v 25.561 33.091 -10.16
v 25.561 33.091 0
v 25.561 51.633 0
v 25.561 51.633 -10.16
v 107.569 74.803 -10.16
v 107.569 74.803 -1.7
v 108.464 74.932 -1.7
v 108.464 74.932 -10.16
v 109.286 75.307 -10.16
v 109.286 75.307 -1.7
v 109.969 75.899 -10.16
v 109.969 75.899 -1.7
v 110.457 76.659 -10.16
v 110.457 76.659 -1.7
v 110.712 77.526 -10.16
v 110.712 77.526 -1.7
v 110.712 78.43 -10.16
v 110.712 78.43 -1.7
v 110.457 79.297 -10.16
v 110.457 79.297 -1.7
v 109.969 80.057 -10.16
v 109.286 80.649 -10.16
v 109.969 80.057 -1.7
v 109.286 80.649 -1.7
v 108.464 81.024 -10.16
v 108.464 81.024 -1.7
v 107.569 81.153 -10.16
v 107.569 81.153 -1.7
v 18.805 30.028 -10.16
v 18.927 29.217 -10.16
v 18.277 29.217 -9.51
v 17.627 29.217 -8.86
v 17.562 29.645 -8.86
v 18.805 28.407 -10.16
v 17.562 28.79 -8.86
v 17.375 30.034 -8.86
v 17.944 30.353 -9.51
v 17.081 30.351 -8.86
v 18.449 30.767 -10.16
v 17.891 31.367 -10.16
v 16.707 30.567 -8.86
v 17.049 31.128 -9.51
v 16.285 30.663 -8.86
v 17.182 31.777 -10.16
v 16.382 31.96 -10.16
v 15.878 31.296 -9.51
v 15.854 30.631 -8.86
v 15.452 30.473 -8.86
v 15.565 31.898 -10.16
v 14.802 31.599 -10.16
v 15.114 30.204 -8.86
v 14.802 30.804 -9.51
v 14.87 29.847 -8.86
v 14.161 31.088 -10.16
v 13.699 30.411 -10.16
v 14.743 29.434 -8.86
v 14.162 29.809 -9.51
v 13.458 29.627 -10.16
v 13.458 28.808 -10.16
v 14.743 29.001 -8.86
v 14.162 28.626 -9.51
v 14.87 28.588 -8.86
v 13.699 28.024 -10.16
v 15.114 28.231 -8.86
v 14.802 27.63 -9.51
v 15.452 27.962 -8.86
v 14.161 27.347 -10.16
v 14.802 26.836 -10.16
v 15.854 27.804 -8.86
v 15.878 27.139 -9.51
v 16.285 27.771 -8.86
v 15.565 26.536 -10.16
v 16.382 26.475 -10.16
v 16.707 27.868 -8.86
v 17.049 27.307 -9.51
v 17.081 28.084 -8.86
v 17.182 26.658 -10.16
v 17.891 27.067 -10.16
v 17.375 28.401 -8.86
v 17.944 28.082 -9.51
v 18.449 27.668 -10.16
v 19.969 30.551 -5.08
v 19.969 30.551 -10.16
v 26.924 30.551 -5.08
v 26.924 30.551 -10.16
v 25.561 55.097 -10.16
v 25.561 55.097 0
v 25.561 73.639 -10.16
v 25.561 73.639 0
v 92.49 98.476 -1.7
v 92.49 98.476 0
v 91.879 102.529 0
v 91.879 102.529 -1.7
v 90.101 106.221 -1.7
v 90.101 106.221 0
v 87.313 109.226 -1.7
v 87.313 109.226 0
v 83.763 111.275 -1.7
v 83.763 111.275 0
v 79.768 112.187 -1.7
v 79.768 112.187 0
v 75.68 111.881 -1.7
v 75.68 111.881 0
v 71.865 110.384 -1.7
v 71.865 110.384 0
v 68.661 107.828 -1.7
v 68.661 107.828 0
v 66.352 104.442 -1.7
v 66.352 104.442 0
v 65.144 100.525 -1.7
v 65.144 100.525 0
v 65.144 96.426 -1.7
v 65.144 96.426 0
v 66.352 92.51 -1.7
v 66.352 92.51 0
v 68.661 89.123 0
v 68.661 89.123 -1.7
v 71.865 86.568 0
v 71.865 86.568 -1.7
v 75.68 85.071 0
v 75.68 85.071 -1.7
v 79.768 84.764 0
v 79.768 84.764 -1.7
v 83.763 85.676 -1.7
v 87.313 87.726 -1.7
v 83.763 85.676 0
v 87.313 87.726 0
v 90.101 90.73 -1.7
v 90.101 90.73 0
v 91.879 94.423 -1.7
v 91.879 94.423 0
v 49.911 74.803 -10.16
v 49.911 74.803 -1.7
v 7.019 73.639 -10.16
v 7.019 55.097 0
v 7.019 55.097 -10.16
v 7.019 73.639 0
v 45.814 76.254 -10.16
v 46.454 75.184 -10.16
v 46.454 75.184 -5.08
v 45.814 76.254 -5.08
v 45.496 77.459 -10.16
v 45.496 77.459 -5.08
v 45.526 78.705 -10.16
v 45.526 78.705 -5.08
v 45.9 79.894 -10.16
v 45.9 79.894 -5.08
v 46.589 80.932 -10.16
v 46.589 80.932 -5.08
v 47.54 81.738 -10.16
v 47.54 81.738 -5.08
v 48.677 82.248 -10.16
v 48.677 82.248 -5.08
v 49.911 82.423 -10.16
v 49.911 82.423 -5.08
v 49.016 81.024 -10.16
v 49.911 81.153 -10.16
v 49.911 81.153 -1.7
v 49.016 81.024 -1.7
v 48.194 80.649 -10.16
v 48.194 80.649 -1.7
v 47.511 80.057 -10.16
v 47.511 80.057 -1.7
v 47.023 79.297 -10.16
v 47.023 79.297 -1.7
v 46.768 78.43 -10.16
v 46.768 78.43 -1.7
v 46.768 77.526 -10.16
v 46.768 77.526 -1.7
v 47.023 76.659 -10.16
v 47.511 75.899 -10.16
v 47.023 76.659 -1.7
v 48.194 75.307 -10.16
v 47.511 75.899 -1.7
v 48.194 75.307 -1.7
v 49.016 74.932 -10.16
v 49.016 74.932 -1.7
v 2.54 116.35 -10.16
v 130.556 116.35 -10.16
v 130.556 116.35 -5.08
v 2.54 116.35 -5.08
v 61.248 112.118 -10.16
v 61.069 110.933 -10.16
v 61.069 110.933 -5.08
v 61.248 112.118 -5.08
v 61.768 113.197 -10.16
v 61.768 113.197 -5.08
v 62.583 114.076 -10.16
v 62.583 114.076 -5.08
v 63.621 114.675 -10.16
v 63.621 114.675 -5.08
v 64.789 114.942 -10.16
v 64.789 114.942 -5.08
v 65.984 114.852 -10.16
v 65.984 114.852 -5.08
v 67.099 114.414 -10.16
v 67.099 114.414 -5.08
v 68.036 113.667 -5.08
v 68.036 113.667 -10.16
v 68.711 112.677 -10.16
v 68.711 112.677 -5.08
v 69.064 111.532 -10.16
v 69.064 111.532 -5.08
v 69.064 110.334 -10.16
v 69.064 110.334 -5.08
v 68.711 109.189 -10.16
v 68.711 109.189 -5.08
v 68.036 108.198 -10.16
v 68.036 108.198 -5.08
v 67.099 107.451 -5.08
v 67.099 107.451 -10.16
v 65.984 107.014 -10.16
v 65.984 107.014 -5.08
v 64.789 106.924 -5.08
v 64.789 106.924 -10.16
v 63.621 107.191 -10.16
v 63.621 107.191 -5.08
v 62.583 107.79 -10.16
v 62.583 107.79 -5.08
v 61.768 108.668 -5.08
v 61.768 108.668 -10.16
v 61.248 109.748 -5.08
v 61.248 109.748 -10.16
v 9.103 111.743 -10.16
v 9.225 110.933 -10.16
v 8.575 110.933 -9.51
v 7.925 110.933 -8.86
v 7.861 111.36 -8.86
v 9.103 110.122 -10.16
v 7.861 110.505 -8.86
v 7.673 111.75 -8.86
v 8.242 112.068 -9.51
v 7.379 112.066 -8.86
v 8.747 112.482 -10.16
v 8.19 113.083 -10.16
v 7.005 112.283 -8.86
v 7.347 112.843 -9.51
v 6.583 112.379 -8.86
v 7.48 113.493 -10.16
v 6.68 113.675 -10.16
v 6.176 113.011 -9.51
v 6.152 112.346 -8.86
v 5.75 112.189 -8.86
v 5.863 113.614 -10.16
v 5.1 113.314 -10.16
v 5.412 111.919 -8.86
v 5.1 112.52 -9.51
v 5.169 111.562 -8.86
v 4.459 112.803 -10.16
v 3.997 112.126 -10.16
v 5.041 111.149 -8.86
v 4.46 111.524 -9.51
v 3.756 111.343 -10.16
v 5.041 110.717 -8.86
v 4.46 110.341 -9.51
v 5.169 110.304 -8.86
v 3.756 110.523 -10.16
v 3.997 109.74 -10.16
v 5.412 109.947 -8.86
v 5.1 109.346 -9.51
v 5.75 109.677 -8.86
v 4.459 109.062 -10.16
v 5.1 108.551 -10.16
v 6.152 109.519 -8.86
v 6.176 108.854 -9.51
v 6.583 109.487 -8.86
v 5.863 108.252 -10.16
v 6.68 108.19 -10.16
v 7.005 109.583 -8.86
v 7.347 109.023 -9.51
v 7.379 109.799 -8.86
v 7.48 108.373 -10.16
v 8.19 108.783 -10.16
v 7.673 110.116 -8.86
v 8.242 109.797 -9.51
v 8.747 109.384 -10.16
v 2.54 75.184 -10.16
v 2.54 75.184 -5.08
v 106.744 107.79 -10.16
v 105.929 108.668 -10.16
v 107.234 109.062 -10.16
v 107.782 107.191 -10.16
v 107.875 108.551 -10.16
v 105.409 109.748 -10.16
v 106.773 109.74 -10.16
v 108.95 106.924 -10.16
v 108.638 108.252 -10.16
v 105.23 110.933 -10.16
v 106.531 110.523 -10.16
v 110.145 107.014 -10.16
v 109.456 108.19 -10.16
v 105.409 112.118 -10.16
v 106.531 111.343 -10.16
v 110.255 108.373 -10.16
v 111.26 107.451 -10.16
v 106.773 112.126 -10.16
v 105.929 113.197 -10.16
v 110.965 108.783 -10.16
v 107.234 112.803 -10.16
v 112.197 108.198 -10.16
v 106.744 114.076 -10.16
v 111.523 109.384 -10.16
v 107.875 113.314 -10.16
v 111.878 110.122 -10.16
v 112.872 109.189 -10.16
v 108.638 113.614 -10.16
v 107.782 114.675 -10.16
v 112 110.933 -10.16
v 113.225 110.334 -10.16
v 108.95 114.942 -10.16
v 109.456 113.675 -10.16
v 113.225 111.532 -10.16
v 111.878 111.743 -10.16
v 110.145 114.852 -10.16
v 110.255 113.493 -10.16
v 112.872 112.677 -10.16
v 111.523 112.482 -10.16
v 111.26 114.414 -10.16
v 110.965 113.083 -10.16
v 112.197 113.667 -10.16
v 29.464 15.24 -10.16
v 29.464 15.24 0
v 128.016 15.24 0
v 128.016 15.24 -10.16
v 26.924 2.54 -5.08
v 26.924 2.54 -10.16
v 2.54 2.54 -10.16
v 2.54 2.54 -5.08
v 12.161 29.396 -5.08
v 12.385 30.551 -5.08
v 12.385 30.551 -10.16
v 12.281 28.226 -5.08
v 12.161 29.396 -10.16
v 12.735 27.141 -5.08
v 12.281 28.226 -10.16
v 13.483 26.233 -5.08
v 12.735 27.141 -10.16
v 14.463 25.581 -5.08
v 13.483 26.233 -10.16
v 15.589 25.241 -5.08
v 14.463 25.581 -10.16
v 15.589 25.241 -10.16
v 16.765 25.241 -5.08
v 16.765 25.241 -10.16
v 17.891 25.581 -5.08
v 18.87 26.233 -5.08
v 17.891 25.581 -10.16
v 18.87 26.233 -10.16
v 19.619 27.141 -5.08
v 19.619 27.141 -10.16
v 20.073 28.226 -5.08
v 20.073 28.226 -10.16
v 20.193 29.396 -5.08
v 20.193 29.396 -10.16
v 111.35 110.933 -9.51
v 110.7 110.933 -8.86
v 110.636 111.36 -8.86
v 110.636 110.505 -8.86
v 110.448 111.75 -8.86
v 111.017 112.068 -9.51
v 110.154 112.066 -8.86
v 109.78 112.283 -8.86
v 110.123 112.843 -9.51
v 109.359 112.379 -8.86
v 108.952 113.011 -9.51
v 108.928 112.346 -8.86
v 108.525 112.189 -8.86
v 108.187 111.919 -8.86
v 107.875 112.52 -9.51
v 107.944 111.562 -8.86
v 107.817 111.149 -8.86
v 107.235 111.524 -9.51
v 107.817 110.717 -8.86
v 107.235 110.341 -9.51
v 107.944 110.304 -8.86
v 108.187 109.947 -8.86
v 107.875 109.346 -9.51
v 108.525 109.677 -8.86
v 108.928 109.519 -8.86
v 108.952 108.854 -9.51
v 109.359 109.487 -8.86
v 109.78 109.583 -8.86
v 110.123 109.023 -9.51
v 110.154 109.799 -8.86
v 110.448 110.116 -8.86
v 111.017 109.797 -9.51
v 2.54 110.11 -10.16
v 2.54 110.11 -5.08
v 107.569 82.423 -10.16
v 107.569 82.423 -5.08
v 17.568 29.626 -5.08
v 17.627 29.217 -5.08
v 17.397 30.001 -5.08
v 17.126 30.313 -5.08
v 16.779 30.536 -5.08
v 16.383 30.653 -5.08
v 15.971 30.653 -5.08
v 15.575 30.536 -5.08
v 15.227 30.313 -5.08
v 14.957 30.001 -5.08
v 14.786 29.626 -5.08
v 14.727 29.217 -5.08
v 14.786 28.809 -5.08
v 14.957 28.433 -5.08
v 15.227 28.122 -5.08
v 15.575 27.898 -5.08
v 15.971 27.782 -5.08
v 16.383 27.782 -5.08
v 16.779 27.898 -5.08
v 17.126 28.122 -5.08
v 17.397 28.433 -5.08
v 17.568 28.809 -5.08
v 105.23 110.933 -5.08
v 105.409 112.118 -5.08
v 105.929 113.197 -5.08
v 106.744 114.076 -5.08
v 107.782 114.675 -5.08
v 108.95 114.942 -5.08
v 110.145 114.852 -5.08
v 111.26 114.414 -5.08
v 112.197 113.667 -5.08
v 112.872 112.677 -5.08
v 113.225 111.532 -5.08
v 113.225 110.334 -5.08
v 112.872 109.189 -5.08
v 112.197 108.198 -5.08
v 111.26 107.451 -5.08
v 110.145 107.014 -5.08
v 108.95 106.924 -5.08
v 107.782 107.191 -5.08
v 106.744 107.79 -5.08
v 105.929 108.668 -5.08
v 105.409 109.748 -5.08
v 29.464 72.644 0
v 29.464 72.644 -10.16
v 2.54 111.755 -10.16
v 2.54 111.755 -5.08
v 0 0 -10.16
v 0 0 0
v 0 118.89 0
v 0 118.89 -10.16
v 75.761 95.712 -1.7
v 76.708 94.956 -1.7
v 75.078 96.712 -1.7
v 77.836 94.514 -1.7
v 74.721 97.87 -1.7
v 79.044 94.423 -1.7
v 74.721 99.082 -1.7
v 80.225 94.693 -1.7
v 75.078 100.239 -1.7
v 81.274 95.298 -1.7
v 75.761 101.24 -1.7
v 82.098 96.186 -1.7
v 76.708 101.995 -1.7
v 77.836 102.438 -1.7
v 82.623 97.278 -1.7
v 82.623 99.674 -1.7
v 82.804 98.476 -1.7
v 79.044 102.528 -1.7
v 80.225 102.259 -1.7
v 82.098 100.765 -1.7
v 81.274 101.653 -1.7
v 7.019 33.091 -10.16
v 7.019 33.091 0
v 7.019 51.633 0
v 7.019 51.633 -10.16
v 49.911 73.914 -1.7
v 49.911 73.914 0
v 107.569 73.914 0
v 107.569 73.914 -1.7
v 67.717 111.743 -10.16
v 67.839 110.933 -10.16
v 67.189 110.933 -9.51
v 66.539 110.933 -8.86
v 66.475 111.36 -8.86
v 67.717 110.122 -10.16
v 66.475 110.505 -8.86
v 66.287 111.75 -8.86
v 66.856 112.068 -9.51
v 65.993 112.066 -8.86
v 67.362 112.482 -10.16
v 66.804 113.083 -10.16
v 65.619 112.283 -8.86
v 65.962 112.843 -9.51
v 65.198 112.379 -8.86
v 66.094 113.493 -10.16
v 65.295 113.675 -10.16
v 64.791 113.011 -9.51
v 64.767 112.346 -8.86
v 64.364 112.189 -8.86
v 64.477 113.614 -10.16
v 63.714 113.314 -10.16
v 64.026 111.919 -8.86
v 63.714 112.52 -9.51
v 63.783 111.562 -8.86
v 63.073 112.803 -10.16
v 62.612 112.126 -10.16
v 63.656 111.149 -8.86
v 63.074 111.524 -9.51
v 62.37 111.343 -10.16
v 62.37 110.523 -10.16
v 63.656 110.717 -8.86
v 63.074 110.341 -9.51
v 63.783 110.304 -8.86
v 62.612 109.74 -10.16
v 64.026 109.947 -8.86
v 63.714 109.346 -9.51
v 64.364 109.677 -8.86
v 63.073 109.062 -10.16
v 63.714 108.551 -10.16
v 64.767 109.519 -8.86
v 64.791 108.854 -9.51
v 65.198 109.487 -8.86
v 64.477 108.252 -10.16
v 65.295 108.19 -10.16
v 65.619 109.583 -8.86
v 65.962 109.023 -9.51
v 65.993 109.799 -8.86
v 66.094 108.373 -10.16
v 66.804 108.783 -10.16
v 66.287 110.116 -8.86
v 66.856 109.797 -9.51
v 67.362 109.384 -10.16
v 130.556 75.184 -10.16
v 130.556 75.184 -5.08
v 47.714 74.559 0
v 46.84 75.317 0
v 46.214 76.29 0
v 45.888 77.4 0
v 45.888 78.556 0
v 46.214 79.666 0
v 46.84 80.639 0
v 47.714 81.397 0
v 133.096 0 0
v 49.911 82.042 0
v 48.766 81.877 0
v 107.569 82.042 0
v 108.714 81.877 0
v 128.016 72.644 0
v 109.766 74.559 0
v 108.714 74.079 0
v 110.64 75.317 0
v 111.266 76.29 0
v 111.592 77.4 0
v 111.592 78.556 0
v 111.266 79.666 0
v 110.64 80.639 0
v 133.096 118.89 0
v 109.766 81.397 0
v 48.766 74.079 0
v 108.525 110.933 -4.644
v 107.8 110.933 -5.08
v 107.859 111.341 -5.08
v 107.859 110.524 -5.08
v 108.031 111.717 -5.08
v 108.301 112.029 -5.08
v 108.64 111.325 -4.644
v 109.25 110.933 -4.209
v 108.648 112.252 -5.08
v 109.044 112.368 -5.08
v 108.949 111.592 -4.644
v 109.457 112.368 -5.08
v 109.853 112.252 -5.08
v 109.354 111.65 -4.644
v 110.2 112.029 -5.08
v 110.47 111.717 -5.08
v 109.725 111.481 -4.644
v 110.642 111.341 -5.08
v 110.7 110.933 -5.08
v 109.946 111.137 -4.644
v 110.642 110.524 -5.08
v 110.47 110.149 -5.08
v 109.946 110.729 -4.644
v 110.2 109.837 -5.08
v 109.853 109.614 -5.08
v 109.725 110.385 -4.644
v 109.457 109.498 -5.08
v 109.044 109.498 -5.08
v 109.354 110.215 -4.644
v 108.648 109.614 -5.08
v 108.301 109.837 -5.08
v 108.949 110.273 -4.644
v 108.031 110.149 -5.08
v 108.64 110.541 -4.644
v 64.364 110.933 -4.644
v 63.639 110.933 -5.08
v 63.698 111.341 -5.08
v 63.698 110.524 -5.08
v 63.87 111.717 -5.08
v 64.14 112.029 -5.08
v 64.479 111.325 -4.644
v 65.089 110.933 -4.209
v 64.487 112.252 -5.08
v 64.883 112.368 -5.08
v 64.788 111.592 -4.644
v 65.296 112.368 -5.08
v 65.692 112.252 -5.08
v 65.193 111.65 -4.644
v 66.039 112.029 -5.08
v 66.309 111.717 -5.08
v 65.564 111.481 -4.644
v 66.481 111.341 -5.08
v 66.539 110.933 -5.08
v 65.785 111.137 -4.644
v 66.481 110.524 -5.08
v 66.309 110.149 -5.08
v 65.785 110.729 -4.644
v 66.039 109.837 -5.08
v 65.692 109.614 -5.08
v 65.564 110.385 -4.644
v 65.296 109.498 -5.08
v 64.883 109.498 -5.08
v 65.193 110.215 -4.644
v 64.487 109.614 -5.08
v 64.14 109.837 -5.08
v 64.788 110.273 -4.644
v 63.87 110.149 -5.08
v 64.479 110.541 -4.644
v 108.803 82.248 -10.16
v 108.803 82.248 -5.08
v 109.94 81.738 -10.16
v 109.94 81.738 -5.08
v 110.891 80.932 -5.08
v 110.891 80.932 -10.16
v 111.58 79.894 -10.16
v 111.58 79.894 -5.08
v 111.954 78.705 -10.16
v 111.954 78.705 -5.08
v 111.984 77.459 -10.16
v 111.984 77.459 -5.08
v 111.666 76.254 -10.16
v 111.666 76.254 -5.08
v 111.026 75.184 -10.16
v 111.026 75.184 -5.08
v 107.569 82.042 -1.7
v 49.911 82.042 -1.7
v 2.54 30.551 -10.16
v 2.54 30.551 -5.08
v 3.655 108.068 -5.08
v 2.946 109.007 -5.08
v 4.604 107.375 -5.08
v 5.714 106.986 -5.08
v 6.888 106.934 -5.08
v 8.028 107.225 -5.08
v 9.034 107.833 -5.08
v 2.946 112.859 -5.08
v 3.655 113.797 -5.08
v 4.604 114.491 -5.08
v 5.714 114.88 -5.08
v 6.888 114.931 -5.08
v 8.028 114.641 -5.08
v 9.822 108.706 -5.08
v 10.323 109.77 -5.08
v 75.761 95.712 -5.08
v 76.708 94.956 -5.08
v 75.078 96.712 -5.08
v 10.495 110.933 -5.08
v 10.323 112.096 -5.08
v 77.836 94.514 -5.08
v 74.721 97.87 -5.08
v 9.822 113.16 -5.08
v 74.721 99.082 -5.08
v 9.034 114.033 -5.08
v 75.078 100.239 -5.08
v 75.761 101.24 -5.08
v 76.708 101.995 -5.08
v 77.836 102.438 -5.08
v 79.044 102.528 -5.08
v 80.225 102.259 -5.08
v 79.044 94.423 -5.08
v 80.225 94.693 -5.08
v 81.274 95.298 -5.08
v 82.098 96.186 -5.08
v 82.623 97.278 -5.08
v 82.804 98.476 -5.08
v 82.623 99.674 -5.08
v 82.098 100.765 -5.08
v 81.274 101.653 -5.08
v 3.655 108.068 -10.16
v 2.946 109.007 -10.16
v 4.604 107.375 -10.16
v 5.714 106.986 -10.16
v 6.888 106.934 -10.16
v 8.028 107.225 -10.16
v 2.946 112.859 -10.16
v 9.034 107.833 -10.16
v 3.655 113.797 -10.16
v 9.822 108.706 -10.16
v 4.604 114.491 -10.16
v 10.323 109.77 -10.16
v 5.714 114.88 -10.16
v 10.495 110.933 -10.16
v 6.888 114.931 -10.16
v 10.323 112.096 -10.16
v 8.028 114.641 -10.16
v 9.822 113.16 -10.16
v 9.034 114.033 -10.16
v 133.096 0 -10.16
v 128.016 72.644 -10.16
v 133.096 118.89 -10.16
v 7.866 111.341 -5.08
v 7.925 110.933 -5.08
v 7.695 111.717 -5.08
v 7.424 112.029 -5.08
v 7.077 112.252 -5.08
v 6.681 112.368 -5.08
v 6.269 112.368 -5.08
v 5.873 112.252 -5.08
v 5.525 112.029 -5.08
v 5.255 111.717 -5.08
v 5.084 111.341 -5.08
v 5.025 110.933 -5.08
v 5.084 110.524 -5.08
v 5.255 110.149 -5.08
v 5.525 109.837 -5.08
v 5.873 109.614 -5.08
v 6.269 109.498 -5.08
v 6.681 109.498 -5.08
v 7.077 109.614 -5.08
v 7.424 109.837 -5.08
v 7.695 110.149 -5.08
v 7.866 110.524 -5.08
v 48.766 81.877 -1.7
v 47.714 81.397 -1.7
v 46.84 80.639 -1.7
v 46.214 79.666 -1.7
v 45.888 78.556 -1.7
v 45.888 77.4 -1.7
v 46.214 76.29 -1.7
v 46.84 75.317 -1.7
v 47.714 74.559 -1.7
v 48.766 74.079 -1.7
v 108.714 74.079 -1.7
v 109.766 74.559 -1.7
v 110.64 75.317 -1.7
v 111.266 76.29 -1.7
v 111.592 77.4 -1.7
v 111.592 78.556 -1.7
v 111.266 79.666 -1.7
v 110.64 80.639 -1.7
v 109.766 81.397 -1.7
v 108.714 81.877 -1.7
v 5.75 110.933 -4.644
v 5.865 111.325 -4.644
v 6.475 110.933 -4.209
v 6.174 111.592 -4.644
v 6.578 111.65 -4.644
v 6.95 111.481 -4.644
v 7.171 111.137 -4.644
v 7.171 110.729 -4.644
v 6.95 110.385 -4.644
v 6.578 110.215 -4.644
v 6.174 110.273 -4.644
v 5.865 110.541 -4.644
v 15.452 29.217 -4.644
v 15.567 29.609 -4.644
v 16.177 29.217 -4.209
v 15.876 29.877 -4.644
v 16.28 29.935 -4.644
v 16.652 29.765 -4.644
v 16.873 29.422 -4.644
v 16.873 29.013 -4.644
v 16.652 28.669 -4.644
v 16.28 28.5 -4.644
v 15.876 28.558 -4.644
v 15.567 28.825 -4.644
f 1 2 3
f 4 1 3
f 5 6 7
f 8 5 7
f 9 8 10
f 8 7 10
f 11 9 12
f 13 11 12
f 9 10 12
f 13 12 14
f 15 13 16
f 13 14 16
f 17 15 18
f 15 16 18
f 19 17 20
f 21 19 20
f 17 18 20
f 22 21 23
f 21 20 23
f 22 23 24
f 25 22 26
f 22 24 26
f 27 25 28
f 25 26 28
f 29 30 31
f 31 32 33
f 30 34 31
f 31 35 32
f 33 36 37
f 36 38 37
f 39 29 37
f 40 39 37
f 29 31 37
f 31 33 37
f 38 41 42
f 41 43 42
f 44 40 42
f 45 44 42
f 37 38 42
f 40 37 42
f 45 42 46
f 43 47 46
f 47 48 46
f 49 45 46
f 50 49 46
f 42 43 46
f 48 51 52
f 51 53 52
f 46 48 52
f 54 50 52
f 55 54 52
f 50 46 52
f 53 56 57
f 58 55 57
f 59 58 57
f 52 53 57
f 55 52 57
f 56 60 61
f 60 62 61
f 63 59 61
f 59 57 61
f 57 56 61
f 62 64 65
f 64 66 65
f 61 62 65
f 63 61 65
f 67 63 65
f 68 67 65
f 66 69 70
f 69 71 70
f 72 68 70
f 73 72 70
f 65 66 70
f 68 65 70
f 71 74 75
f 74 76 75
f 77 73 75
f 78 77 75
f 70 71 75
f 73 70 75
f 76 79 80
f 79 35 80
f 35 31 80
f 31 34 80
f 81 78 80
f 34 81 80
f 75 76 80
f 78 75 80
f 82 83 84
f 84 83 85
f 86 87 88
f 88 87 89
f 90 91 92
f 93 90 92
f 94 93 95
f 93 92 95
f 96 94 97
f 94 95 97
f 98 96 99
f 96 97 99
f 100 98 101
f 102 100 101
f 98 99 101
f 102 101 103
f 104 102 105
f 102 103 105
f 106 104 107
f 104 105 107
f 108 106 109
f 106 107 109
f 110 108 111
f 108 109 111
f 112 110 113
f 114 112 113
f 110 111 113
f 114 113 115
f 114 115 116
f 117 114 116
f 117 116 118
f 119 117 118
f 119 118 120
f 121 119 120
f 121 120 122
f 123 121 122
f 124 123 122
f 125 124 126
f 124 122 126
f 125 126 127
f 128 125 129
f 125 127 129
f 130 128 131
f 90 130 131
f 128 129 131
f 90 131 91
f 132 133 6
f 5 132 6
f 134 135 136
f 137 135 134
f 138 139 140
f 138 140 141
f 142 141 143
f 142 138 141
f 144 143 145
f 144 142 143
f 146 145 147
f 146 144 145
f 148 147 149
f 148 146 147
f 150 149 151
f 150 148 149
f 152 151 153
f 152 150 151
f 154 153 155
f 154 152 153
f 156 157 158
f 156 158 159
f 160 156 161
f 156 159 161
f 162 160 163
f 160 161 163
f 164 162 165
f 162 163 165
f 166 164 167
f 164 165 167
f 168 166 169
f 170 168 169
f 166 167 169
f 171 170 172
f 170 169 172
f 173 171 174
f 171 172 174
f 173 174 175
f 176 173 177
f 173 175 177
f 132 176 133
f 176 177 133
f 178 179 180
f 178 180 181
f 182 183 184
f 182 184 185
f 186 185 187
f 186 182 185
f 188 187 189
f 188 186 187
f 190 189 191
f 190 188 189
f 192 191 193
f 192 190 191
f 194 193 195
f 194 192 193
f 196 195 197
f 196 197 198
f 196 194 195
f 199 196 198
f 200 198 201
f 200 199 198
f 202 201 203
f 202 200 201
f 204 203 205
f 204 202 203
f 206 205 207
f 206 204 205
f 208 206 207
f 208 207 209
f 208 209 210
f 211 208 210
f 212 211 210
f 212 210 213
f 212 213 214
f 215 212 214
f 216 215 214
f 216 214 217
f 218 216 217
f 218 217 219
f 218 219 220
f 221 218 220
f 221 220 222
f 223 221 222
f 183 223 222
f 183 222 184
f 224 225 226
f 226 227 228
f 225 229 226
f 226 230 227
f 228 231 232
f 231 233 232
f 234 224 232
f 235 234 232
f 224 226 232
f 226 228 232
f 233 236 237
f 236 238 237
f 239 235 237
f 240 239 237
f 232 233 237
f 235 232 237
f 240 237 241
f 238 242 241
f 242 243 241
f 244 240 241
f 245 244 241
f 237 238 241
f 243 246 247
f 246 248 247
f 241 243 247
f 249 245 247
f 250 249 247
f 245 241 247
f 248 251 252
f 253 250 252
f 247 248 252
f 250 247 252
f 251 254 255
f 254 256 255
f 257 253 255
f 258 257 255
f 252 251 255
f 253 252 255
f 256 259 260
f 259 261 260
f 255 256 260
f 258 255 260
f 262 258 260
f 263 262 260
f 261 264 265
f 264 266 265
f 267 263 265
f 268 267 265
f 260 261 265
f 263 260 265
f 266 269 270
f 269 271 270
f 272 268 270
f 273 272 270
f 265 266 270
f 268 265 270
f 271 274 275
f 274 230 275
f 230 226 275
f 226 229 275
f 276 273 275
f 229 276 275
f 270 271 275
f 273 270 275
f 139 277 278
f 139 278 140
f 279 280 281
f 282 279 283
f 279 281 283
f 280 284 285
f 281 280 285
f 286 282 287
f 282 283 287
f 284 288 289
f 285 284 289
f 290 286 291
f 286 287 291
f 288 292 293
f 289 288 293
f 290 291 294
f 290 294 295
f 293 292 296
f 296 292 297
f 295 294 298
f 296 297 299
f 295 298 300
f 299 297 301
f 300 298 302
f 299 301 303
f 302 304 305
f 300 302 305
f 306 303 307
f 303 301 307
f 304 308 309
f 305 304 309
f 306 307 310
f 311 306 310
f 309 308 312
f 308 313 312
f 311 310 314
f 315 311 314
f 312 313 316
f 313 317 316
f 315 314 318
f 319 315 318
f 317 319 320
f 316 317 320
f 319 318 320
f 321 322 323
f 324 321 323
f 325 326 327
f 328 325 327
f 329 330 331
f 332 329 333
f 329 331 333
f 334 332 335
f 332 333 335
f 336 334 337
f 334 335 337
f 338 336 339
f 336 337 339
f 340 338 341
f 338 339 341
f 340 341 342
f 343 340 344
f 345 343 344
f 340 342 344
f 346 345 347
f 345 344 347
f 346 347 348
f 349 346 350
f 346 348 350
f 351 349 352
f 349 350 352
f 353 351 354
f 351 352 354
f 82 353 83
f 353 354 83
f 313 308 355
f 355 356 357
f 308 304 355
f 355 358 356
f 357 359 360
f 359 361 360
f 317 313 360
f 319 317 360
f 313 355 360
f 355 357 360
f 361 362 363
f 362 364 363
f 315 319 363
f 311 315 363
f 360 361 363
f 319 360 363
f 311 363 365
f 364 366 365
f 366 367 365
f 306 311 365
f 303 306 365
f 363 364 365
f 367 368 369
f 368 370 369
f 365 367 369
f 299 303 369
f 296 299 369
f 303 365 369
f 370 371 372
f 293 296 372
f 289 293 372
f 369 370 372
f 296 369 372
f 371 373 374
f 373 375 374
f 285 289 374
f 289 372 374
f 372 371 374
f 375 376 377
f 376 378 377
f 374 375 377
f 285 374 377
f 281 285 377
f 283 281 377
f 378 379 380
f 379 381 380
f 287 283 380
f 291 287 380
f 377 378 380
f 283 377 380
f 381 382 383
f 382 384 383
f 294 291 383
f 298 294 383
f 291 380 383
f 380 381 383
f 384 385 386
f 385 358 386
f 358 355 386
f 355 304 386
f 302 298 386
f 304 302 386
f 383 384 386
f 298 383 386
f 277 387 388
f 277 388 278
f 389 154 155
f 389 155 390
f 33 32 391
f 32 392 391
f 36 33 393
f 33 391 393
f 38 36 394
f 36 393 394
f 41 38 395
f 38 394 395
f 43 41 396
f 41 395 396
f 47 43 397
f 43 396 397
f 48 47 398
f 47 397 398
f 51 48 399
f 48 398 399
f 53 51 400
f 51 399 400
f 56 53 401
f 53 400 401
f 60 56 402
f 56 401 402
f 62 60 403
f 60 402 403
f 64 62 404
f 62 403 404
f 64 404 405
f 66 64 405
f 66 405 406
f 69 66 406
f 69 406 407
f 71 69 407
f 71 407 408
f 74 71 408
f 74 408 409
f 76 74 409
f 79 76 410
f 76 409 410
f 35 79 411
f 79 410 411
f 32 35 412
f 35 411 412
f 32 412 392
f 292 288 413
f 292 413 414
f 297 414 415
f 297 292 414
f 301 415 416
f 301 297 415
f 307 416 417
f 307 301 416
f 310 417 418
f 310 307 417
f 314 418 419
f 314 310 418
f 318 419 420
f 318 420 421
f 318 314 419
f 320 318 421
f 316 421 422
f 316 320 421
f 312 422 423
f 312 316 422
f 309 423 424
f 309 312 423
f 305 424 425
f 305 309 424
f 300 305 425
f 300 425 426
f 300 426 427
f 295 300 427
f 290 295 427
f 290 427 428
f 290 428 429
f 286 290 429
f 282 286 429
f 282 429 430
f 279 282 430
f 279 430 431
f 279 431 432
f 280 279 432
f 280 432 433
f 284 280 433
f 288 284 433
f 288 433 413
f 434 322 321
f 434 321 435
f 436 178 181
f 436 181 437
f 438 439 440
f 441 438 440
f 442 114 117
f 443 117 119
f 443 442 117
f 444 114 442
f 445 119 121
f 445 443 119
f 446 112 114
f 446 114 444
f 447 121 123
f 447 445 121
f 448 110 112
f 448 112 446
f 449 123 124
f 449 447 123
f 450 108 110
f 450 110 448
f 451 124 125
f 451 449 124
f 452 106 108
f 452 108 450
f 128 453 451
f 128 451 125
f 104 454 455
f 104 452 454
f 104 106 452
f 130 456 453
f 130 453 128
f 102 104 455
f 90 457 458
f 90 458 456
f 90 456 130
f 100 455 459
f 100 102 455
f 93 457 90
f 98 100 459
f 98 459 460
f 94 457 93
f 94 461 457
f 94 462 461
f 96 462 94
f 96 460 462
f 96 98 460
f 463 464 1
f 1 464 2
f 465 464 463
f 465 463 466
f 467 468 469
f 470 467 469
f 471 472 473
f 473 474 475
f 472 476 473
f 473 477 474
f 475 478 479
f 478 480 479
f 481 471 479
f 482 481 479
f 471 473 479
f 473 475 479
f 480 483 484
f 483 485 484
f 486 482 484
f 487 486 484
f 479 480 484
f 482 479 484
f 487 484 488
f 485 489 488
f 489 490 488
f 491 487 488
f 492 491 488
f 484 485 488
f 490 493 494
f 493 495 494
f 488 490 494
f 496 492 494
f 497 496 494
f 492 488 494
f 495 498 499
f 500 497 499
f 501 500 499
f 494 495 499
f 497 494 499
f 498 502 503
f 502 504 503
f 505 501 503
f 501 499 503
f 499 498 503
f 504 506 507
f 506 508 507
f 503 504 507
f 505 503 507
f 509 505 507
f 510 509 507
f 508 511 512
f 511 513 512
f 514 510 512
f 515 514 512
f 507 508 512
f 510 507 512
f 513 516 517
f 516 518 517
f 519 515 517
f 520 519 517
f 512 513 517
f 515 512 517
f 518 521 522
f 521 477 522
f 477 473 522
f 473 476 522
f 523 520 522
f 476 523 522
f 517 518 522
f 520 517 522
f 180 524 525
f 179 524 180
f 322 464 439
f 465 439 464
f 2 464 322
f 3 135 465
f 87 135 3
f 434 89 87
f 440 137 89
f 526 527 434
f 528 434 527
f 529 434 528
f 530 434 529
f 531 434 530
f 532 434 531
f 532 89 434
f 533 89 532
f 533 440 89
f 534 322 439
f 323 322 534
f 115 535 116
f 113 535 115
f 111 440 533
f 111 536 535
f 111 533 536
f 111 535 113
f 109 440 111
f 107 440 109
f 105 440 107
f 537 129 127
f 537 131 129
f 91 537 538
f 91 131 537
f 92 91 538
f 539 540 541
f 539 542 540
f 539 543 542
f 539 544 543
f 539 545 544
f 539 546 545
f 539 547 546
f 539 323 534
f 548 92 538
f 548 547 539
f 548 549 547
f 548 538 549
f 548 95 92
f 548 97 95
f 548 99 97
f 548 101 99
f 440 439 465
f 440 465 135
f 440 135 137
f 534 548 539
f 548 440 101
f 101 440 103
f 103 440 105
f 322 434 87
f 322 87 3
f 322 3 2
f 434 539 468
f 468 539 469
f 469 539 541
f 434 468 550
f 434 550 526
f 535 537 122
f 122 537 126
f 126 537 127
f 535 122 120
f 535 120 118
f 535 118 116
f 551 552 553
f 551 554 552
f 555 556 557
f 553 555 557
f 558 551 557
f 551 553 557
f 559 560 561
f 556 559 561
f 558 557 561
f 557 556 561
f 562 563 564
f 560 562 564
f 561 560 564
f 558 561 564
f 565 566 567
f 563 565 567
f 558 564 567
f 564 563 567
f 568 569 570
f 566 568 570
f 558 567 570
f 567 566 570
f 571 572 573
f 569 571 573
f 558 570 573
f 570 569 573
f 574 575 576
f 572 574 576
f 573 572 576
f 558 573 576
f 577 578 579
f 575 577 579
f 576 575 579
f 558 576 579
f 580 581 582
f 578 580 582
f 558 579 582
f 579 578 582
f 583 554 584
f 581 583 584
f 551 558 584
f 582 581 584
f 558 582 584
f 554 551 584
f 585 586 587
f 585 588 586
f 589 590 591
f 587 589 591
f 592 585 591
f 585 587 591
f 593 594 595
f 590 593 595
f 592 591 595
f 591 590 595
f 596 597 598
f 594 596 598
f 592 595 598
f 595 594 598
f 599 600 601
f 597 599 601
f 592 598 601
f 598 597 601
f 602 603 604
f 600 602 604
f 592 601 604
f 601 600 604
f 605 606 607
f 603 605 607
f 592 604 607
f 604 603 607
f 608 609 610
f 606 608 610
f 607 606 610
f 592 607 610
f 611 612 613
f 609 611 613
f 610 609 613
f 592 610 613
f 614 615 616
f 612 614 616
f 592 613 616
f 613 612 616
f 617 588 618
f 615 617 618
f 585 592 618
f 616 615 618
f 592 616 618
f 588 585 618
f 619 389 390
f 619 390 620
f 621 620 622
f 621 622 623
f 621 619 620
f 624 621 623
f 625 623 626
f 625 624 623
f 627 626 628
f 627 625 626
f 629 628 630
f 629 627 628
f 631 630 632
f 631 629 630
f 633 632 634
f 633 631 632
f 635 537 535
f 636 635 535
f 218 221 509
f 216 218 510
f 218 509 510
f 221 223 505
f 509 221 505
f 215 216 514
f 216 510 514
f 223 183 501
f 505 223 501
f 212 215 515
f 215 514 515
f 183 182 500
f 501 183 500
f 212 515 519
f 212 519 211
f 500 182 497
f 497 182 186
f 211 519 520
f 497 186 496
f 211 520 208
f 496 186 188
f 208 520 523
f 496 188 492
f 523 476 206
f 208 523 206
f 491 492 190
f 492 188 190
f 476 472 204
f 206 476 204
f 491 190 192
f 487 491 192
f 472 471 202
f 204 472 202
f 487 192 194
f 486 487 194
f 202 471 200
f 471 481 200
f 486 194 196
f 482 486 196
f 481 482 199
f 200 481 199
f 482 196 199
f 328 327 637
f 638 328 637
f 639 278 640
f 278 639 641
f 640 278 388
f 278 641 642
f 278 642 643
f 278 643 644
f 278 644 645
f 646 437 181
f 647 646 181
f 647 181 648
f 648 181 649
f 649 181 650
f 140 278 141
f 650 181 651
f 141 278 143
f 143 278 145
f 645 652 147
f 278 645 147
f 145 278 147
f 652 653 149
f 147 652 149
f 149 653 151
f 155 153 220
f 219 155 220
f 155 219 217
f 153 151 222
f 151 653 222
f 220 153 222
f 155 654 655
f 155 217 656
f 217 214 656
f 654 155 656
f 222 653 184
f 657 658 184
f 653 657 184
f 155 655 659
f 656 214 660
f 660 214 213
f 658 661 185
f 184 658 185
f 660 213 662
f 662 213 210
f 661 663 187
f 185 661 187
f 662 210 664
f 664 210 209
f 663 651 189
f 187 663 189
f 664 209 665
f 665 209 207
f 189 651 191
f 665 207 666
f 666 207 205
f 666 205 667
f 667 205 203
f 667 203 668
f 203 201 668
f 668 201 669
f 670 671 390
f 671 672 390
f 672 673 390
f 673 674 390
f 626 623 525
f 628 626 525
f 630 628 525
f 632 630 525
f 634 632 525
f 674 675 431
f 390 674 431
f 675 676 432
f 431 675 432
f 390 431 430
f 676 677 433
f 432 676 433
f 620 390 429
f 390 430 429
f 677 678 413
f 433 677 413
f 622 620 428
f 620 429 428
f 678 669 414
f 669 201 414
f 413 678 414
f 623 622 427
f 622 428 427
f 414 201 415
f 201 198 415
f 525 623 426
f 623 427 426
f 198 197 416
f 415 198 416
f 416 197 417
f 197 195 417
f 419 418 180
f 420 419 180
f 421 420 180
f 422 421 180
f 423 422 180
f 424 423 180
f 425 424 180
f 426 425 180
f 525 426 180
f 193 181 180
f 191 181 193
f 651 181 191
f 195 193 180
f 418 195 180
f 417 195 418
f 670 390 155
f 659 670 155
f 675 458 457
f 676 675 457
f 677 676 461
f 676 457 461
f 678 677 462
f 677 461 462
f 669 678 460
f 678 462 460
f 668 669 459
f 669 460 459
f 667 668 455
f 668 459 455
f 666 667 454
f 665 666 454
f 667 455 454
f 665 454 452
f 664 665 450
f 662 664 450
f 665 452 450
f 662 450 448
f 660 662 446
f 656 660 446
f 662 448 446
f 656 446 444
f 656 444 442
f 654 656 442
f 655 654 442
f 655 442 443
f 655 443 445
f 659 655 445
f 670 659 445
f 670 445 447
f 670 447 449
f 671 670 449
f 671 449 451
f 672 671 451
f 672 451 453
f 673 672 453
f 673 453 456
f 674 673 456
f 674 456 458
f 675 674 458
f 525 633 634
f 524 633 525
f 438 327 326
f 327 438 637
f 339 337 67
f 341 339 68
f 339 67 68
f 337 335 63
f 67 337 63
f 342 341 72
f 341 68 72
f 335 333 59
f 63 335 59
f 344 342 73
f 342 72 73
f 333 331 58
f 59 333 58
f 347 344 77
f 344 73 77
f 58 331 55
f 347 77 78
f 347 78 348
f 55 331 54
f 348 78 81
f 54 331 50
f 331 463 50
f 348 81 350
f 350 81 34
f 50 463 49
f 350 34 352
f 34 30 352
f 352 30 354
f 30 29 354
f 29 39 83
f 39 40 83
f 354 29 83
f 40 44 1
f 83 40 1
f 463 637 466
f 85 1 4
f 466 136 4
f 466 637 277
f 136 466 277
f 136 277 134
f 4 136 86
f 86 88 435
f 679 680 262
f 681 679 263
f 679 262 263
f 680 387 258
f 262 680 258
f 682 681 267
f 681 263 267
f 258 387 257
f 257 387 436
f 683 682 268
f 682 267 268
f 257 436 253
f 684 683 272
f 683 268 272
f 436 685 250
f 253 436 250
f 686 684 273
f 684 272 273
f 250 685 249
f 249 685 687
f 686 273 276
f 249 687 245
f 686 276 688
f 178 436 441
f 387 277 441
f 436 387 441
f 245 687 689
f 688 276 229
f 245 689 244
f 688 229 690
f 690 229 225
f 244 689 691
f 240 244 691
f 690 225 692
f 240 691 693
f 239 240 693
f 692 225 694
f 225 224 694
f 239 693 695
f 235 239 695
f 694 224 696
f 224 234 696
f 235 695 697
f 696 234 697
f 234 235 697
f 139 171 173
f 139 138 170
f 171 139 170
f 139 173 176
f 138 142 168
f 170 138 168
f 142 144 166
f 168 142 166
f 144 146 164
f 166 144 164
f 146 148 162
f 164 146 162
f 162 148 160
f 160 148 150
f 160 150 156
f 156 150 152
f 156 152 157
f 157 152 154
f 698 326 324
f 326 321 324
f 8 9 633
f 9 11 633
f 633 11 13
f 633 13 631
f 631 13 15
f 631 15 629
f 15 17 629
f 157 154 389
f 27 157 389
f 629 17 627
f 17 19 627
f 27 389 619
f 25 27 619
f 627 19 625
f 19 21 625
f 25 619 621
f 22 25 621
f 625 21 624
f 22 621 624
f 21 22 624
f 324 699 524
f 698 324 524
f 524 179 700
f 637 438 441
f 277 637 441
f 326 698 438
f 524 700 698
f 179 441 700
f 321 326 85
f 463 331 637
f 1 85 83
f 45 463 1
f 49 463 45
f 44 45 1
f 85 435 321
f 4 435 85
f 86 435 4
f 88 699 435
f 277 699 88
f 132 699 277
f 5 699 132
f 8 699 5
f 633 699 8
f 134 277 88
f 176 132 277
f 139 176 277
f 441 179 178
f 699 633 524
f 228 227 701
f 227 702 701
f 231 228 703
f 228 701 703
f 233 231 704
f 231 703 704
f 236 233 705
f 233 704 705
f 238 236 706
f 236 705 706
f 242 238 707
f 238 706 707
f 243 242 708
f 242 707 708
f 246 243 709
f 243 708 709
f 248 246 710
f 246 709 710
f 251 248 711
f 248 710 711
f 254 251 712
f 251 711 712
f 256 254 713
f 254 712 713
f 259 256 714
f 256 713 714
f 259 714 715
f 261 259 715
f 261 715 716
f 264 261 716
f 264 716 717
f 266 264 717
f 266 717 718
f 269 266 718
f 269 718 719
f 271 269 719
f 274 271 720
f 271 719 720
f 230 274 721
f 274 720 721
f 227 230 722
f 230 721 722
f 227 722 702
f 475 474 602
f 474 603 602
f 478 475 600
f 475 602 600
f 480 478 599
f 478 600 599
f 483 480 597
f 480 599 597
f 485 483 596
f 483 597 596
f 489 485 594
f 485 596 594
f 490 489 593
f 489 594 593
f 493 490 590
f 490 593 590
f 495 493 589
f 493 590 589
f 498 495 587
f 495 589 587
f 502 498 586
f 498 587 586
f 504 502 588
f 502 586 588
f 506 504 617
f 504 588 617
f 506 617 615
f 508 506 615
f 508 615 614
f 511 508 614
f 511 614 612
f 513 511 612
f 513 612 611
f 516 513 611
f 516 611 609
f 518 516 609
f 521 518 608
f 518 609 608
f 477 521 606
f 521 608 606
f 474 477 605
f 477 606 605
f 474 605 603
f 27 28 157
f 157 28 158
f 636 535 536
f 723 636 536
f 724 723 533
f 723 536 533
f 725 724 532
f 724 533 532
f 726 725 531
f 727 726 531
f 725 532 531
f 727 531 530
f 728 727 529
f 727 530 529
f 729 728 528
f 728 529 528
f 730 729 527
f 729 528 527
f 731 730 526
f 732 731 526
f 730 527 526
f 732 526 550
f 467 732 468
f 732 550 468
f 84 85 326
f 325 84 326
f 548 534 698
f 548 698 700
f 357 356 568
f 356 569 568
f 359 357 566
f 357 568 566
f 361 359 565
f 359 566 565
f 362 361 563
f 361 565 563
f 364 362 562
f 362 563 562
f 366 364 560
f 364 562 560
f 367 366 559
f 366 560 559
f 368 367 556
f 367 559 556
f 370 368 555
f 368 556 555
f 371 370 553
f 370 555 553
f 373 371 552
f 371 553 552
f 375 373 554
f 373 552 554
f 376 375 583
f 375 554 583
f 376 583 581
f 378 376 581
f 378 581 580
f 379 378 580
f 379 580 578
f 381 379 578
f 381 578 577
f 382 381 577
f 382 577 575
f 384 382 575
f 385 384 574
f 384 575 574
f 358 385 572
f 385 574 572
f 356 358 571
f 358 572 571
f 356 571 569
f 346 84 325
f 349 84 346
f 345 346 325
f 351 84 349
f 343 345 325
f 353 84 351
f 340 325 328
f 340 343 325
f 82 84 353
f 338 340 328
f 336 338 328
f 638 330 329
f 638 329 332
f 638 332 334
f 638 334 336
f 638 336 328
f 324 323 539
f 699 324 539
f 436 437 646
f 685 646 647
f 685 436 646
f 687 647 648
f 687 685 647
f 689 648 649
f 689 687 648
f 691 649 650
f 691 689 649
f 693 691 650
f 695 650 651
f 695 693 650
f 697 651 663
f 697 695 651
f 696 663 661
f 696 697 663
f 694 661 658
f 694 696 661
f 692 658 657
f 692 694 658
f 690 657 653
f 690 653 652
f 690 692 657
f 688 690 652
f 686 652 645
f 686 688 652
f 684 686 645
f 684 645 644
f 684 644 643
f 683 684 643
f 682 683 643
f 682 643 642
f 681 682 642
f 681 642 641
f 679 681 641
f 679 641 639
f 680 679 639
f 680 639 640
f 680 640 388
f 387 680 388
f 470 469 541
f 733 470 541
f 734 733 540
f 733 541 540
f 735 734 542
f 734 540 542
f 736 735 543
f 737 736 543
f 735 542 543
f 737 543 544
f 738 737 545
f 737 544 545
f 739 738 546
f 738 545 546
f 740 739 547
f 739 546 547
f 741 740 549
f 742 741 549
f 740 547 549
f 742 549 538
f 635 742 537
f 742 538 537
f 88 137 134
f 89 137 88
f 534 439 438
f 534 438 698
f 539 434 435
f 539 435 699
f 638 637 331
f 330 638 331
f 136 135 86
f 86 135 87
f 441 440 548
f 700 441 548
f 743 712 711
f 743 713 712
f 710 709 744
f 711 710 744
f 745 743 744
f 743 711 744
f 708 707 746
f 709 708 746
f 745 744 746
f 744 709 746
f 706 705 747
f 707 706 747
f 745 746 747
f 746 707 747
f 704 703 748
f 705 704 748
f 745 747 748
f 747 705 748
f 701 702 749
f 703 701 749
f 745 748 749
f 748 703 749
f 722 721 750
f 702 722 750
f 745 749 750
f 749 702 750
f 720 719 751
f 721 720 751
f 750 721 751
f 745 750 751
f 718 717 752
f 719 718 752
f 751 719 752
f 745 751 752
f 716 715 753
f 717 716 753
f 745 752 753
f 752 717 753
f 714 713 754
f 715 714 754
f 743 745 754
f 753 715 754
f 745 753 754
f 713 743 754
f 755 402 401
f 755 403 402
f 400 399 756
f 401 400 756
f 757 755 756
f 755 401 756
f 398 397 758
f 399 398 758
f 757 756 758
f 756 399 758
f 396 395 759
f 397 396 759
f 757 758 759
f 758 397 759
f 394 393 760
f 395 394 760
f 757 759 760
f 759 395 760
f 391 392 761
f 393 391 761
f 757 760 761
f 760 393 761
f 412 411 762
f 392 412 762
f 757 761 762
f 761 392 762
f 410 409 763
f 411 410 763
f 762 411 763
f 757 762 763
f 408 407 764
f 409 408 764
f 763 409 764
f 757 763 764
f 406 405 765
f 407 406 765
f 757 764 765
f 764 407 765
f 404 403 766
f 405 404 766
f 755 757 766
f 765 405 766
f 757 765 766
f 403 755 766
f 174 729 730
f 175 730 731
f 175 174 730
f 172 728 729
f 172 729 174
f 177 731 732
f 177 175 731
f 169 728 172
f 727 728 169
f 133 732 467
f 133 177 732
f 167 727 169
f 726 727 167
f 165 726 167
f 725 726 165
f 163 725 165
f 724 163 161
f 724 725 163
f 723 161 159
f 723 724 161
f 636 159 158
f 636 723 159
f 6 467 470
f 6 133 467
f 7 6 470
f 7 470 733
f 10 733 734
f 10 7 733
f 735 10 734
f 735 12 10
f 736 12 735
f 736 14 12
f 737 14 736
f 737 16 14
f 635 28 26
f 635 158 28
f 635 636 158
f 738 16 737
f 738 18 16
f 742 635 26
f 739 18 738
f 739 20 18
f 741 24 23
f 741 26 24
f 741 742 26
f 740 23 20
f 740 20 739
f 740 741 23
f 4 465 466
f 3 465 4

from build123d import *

# Parameters (mm, degrees)
SKETCH1_W                                         = 133.096
SKETCH1_H                                         = 118.890132416
BOSS_EXTRUDE1_DEPTH                               = 10.16
SKETCH1_11_W                                      = 98.552
SKETCH1_11_H                                      = 57.404
SKETCH1_11_W_2                                    = 18.542
SKETCH1_11_H_2                                    = 18.542
SKETCH1_11_R                                      = 4.064
CUT_EXTRUDE1_DEPTH                                = 179.752998302
SKETCH1_12_R                                      = 13.75
SKETCH1_12_R_2                                    = 4.064
CUT_EXTRUDE2_DEPTH                                = 1.7
CSK_FOR_M2_5_FLAT_HEAD_MACHINE_SCREW1_D           = 2.9
CSK_FOR_M2_5_FLAT_HEAD_MACHINE_SCREW1_DEPTH       = 5.08
CSK_FOR_M2_5_FLAT_HEAD_MACHINE_SCREW1_CSINK_D     = 5.5
CSK_FOR_M2_5_FLAT_HEAD_MACHINE_SCREW1_CSINK_ANGLE = 90
CSK_FOR_M2_5_FLAT_HEAD_MACHINE_SCREW1_TIP         = 0.871247898
SKETCH6_R                                         = 4.02
CUT_EXTRUDE3_DEPTH                                = 7.62


with BuildPart() as part:
    # Sketch1 → Boss-Extrude1 (new body)
    with BuildSketch(Plane.XY):
        with Locations((66.548, 59.445066208)):
            Rectangle(SKETCH1_W, SKETCH1_H)
    extrude(amount=-BOSS_EXTRUDE1_DEPTH)

    # Sketch1<11> → Cut-Extrude1 (cut, through all)
    with BuildSketch(Plane.XY):
        with Locations((78.74, 43.942)):
            Rectangle(SKETCH1_11_W, SKETCH1_11_H)
        with Locations((16.289896793, 42.362289183)):
            Rectangle(SKETCH1_11_W_2, SKETCH1_11_H_2)
        with Locations((16.289896793, 64.367970222)):
            Rectangle(SKETCH1_11_W_2, SKETCH1_11_H_2)
        with BuildLine():
            Line((107.569, 81.153), (49.911, 81.153))
            ThreePointArc((49.911, 81.153), (46.736, 77.978), (49.911, 74.803))
            Line((49.911, 74.803), (107.569, 74.803))
            ThreePointArc((107.569, 74.803), (110.744, 77.978), (107.569, 81.153))
        make_face()
        with Locations((78.74, 98.4758)):
            Circle(SKETCH1_11_R)
    extrude(amount=-CUT_EXTRUDE1_DEPTH, mode=Mode.SUBTRACT)

    # Sketch1<12> → Cut-Extrude2 (cut)
    # profile 1 of 2: a face of its own
    with BuildSketch(Plane.XY):
        with BuildLine():
            Line((107.569, 82.042), (49.911, 82.042))
            ThreePointArc((49.911, 82.042), (45.847, 77.978), (49.911, 73.914))
            Line((49.911, 73.914), (107.569, 73.914))
            ThreePointArc((107.569, 73.914), (111.633, 77.978), (107.569, 82.042))
        make_face()
        with BuildLine():
            ThreePointArc((49.911, 74.803), (46.736, 77.978), (49.911, 81.153))
            Line((49.911, 81.153), (107.569, 81.153))
            ThreePointArc((107.569, 81.153), (110.744, 77.978), (107.569, 74.803))
            Line((107.569, 74.803), (49.911, 74.803))
        make_face(mode=Mode.SUBTRACT)
    # profile 2 of 2: a face of its own
    with BuildSketch(Plane.XY):
        with Locations((78.74, 98.4758)):
            Circle(SKETCH1_12_R)
        with Locations((78.74, 98.4758)):
            Circle(SKETCH1_12_R_2, mode=Mode.SUBTRACT)
    extrude(amount=-CUT_EXTRUDE2_DEPTH, mode=Mode.SUBTRACT)

    # CSK for M2.5 Flat Head Machine Screw1
    with Locations(Plane(origin=(0, 0, -10.16), x_dir=(-1, 0, 0), z_dir=(0, 0, -1))):
        with Locations((-109.250378399, 110.932782256), (-65.089376176, 110.932782256), (-6.474944958, 110.932782256), (-16.176873925, 29.217411756)):
            CounterSinkHole(CSK_FOR_M2_5_FLAT_HEAD_MACHINE_SCREW1_D / 2, CSK_FOR_M2_5_FLAT_HEAD_MACHINE_SCREW1_CSINK_D / 2, depth=CSK_FOR_M2_5_FLAT_HEAD_MACHINE_SCREW1_DEPTH, counter_sink_angle=CSK_FOR_M2_5_FLAT_HEAD_MACHINE_SCREW1_CSINK_ANGLE)
            with Locations((0, 0, -(CSK_FOR_M2_5_FLAT_HEAD_MACHINE_SCREW1_DEPTH + CSK_FOR_M2_5_FLAT_HEAD_MACHINE_SCREW1_TIP / 2))):  # 118° drill point
                Cone(0, CSK_FOR_M2_5_FLAT_HEAD_MACHINE_SCREW1_D / 2, CSK_FOR_M2_5_FLAT_HEAD_MACHINE_SCREW1_TIP, mode=Mode.SUBTRACT)

    # Sketch6 → Cut-Extrude3 (cut)
    # profile 1 of 2: a face of its own
    with BuildSketch(Plane(origin=(0, 0, -12.7), x_dir=(-1, 0, 0), z_dir=(0, 0, -1))):
        with BuildLine():
            Line((-130.556, 116.350132416), (-2.54, 116.350132416))
            Line((-2.54, 116.350132416), (-2.54, 111.755344215))
            ThreePointArc((-2.54, 111.755344215), (-10.494944958, 110.932782256), (-2.54, 110.110220296))
            Line((-2.54, 110.110220296), (-2.54, 75.184))
            Line((-2.54, 75.184), (-46.453892972, 75.184))
            ThreePointArc((-46.453892972, 75.184), (-45.899930629, 79.893554097), (-49.911, 82.423))
            Line((-49.911, 82.423), (-107.569, 82.423))
            ThreePointArc((-107.569, 82.423), (-111.580069371, 79.893554097), (-111.026107028, 75.184))
            Line((-111.026107028, 75.184), (-130.556, 75.184))
            Line((-130.556, 75.184), (-130.556, 116.350132416))
        make_face()
        with Locations((-109.250378399, 110.932782256)):
            Circle(SKETCH6_R, mode=Mode.SUBTRACT)
        with Locations((-65.089376176, 110.932782256)):
            Circle(SKETCH6_R, mode=Mode.SUBTRACT)
    # profile 2 of 2: a face of its own
    with BuildSketch(Plane(origin=(0, 0, -12.7), x_dir=(-1, 0, 0), z_dir=(0, 0, -1))):
        with BuildLine():
            Line((-26.924, 30.551289183), (-26.924, 2.54))
            Line((-26.924, 2.54), (-2.54, 2.54))
            Line((-2.54, 2.54), (-2.54, 30.551289183))
            Line((-2.54, 30.551289183), (-12.384622481, 30.551289183))
            ThreePointArc((-12.384622481, 30.551289183), (-16.176873925, 25.197411756), (-19.969125368, 30.551289183))
            Line((-19.969125368, 30.551289183), (-26.924, 30.551289183))
        make_face()
    extrude(amount=-CUT_EXTRUDE3_DEPTH, mode=Mode.SUBTRACT)


solid = part.part
